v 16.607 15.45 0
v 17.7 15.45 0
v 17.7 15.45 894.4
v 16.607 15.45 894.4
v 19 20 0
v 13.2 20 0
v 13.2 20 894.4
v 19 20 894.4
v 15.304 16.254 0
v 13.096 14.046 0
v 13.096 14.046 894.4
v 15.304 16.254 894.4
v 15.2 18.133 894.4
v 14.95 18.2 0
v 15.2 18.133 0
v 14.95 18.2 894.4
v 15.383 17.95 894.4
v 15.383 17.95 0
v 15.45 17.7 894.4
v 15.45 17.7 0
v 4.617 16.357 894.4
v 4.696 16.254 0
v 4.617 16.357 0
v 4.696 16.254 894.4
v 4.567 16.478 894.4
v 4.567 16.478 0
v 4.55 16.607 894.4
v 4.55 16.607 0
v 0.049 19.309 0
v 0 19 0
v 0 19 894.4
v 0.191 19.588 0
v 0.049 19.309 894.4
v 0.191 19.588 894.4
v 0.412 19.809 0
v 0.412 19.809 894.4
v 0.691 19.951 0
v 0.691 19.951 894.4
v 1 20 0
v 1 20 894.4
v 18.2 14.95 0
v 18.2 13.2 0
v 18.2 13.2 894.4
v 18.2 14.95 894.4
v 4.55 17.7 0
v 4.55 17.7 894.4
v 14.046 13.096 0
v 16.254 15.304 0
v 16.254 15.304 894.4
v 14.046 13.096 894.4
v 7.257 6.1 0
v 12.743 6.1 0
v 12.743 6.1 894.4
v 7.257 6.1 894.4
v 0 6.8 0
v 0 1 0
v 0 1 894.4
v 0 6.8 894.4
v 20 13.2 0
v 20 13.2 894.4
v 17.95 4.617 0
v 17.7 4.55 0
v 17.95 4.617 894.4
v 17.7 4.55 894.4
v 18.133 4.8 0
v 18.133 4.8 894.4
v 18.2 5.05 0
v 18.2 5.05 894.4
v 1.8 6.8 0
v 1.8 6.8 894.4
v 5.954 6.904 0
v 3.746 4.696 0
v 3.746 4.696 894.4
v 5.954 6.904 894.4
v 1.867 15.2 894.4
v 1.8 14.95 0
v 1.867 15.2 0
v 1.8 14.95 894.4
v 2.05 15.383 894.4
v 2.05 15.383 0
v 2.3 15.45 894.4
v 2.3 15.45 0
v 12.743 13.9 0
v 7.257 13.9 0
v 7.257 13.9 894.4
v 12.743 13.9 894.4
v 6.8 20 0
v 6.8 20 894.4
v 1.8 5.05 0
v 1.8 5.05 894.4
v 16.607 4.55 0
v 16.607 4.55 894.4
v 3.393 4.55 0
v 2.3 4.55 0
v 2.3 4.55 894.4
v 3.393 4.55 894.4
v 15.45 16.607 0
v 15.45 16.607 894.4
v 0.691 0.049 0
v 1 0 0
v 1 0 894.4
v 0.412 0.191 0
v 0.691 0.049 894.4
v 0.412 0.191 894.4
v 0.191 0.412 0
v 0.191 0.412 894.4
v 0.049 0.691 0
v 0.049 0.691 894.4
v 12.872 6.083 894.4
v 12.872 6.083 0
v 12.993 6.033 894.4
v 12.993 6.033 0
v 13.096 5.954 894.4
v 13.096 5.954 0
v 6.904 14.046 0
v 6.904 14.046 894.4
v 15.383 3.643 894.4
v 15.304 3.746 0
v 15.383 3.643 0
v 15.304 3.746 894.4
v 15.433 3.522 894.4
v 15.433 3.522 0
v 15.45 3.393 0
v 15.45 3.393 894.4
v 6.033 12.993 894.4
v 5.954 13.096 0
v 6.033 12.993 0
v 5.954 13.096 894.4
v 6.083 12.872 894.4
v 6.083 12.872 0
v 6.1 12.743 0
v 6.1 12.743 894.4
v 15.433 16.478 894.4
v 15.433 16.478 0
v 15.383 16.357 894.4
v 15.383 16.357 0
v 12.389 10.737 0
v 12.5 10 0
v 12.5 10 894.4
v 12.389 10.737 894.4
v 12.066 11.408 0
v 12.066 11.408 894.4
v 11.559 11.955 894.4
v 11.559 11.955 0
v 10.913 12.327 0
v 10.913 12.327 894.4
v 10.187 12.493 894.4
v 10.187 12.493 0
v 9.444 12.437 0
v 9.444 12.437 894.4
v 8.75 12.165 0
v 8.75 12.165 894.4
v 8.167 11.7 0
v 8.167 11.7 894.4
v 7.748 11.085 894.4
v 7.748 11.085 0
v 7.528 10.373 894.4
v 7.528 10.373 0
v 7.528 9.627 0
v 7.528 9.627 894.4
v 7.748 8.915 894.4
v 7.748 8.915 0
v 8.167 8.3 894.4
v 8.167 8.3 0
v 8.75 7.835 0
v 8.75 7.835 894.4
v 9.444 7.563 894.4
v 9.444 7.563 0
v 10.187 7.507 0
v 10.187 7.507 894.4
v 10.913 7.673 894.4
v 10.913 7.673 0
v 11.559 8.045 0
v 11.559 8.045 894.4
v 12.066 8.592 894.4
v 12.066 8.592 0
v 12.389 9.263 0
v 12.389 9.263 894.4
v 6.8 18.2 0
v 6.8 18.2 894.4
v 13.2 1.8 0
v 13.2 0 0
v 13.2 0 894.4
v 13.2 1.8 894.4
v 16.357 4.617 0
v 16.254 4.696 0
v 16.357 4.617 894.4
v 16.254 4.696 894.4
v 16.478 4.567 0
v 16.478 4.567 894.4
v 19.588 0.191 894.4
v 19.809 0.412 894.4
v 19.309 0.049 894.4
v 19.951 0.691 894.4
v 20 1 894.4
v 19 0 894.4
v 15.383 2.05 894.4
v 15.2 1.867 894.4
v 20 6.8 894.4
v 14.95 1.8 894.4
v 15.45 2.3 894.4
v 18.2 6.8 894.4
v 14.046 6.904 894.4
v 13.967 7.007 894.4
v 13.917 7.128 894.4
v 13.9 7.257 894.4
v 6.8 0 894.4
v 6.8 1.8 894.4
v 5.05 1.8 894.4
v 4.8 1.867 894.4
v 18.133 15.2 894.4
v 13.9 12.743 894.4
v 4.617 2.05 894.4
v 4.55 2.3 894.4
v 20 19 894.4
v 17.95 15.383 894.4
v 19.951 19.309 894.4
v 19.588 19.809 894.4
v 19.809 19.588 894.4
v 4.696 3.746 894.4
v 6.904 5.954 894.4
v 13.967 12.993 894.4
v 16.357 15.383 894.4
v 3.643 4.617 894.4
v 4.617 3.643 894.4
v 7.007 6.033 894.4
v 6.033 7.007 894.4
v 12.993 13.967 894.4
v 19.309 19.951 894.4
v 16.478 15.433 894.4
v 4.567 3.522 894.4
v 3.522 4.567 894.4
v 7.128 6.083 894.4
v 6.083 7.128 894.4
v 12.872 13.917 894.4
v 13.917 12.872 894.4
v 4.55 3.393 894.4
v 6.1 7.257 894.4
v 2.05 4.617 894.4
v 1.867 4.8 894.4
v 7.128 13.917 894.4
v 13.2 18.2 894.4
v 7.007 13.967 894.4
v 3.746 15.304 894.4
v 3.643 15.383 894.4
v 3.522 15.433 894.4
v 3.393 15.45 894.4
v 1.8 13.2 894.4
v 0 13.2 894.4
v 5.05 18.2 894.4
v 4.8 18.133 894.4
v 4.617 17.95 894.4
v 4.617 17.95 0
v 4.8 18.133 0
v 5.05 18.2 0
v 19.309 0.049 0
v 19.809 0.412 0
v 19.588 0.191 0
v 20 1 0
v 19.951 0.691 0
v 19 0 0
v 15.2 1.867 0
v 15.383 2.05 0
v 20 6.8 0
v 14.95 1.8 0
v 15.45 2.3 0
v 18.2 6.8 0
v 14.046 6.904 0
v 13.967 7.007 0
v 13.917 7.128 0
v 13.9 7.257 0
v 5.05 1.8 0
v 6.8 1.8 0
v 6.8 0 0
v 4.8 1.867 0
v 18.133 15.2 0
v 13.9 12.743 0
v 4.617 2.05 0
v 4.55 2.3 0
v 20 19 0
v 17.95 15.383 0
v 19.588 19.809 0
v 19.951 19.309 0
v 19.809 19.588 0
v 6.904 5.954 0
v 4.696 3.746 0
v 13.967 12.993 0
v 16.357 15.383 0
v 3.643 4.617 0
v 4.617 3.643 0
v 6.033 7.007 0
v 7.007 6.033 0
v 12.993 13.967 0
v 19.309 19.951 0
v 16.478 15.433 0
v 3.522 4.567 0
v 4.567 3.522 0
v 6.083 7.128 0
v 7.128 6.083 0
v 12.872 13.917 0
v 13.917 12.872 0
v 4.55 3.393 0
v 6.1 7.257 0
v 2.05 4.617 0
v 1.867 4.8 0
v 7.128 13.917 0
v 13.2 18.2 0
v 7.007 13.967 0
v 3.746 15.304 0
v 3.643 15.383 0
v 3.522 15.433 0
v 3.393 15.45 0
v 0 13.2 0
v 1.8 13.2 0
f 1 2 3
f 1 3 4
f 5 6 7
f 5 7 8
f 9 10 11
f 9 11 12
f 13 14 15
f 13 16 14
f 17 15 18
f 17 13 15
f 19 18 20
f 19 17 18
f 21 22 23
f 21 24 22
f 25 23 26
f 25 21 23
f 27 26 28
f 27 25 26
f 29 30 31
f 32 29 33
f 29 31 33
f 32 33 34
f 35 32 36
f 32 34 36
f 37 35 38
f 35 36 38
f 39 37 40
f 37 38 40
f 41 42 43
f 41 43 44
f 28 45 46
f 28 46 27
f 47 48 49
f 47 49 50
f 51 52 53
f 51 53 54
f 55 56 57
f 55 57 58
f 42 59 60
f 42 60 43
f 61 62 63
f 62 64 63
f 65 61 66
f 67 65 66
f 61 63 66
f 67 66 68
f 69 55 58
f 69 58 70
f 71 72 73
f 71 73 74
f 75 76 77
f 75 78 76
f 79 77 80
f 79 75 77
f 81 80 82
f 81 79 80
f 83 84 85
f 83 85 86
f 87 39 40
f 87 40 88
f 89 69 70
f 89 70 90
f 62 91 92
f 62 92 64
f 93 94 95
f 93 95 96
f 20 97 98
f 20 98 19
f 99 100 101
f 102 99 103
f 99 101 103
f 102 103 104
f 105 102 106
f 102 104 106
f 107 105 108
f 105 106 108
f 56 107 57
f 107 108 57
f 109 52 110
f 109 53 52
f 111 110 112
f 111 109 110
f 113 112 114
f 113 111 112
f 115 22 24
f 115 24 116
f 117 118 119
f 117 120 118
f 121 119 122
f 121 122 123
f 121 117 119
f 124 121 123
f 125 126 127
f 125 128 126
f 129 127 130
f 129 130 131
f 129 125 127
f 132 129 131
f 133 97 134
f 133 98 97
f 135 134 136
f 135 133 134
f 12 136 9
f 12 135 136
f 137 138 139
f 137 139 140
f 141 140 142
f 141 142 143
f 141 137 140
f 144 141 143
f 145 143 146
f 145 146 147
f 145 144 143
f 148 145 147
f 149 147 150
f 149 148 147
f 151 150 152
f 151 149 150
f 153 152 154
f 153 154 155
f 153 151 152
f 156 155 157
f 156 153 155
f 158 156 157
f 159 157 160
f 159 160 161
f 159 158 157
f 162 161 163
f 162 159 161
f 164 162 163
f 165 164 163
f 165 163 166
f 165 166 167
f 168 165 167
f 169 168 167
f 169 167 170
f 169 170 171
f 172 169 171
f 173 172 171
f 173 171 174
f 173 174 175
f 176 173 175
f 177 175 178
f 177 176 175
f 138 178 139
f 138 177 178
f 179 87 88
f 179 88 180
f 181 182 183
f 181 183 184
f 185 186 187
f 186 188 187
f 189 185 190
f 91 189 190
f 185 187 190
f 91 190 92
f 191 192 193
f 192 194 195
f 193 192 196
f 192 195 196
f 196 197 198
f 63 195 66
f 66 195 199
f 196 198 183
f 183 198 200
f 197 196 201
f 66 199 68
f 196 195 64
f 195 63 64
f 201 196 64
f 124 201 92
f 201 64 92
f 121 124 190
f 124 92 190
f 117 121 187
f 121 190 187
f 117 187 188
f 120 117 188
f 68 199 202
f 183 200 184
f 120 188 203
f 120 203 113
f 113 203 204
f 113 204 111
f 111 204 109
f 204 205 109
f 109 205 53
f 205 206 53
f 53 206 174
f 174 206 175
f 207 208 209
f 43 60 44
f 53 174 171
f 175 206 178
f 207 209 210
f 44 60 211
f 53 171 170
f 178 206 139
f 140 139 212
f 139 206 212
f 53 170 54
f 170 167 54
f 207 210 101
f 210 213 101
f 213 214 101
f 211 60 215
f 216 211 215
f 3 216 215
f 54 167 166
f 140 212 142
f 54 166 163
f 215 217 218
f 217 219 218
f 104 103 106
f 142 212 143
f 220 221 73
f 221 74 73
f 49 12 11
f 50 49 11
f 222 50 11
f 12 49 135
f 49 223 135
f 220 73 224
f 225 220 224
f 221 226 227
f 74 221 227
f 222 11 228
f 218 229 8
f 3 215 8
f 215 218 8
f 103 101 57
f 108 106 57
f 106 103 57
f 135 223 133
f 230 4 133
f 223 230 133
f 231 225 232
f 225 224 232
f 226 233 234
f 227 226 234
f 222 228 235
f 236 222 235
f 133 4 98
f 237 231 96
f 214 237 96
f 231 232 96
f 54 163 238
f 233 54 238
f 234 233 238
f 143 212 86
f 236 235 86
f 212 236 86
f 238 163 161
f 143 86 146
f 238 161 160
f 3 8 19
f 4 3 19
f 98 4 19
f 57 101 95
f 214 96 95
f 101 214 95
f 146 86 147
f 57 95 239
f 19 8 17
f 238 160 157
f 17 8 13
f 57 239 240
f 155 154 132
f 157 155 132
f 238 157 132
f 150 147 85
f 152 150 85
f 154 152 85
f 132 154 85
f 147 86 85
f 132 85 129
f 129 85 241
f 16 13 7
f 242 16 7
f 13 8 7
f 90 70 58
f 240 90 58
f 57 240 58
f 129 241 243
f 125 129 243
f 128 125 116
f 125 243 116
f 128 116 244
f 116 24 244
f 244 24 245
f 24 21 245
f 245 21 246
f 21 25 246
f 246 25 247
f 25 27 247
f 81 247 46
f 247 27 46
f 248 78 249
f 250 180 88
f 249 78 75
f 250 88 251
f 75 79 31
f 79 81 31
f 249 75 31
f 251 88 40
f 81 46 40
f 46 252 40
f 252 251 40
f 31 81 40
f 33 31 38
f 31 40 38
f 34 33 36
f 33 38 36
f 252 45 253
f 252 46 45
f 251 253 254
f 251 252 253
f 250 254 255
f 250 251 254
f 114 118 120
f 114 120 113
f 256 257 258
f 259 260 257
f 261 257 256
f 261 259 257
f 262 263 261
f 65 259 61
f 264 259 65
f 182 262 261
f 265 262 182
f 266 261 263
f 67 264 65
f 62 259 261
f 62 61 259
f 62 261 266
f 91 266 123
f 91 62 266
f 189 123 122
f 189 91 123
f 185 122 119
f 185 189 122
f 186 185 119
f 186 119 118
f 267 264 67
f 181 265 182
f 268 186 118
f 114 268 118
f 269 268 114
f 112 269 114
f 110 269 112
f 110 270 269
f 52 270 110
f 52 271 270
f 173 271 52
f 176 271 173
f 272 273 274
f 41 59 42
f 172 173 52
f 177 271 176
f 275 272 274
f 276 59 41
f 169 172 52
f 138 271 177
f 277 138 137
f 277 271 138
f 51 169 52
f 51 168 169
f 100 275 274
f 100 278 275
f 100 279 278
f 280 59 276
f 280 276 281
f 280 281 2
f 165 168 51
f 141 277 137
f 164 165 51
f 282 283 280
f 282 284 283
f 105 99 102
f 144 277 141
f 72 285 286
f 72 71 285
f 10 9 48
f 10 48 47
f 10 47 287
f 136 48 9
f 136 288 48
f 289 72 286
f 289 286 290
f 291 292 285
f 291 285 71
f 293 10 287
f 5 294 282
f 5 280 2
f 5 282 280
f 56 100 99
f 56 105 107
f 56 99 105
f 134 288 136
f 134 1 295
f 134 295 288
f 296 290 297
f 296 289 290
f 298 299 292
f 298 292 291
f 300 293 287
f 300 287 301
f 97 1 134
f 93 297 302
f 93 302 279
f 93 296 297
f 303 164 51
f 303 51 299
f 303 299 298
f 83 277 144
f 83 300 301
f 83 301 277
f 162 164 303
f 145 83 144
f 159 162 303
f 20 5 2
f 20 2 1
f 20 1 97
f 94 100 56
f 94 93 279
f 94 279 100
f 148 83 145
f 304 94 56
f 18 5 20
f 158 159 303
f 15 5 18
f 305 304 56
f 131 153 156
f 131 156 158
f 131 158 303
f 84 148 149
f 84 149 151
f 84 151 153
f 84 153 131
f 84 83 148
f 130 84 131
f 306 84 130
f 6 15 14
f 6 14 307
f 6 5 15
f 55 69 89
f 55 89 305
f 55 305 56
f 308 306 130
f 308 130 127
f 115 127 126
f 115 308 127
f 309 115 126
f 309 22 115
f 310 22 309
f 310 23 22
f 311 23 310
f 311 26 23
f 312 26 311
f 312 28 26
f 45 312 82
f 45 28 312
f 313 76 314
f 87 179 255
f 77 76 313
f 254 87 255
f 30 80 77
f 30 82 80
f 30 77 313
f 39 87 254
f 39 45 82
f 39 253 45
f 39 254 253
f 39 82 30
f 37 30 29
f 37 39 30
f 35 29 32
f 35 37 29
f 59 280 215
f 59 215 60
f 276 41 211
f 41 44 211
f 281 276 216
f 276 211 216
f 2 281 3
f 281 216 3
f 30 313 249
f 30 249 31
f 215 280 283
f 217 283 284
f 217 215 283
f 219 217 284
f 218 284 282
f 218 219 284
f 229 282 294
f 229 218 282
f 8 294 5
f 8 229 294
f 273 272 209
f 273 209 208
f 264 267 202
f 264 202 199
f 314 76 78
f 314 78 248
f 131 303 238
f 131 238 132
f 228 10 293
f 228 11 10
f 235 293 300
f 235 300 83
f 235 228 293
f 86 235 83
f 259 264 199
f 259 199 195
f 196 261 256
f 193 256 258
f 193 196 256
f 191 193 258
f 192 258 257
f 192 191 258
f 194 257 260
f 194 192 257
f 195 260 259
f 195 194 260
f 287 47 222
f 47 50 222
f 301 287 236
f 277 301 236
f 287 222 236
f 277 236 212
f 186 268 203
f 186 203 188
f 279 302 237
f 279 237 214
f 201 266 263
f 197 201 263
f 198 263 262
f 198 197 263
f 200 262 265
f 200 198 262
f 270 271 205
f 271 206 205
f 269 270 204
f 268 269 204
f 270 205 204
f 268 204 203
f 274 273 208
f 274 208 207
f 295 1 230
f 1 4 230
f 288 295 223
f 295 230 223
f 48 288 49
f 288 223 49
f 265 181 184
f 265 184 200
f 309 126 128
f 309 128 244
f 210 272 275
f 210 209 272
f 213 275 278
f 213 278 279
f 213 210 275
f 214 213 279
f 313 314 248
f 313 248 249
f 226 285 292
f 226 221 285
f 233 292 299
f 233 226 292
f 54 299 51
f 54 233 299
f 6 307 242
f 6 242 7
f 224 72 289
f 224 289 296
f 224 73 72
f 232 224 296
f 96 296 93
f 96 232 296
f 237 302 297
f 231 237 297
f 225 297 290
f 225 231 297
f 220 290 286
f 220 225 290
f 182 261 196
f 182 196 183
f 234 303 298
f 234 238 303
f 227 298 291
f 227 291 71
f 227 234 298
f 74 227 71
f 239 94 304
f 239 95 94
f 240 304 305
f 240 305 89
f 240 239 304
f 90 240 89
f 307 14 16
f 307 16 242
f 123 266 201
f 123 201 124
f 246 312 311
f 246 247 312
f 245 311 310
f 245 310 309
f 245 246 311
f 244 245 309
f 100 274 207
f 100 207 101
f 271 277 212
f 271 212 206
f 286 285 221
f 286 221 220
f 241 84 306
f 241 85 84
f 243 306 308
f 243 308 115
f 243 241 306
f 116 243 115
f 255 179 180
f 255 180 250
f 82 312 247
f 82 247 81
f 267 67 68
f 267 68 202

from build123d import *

# Parameters (mm, degrees)
SKETCH1_R           = 2.5
BOSS_EXTRUDE1_DEPTH = 894.4
FILLET1_R           = 1
FILLET2_R           = 0.5
FILLET3_R           = 0.5
FILLET4_R           = 0.5
FILLET5_R           = 0.5


with BuildPart() as part:
    # Sketch1 → Boss-Extrude1 (new body)
    with BuildSketch(Plane.XY):
        Polygon((13.2, 0), (13.2, 1.8), (15.45, 1.8), (15.45, 3.6), (12.95, 6.1), (7.05, 6.1), (4.55, 3.6), (4.55, 1.8), (6.8, 1.8), (6.8, 0), (0, 0), (0, 6.8), (1.8, 6.8), (1.8, 4.55), (3.6, 4.55), (6.1, 7.05), (6.1, 12.95), (3.6, 15.45), (1.8, 15.45), (1.8, 13.2), (0, 13.2), (0, 20), (6.8, 20), (6.8, 18.2), (4.55, 18.2), (4.55, 16.4), (7.05, 13.9), (12.95, 13.9), (15.45, 16.4), (15.45, 18.2), (13.2, 18.2), (13.2, 20), (20, 20), (20, 13.2), (18.2, 13.2), (18.2, 15.45), (16.4, 15.45), (13.9, 12.95), (13.9, 7.05), (16.4, 4.55), (18.2, 4.55), (18.2, 6.8), (20, 6.8), (20, 0), align=None)
        with Locations((10, 10)):
            Circle(SKETCH1_R, mode=Mode.SUBTRACT)
    extrude(amount=BOSS_EXTRUDE1_DEPTH)

    # Fillet1
    fillet1_edges = [part.edges().sort_by_distance(p)[0] for p in [
        (0, 0, 447.2),
        (0, 20, 447.2),
        (20, 20, 447.2),
        (20, 0, 447.2),
    ]]
    fillet(fillet1_edges, radius=FILLET1_R)

    # Fillet2
    fillet2_edges = [part.edges().sort_by_distance(p)[0] for p in [
        (4.55, 18.2, 447.2),
        (4.55, 16.4, 447.2),
        (7.05, 13.9, 447.2),
        (12.95, 13.9, 447.2),
        (15.45, 16.4, 447.2),
        (15.45, 18.2, 447.2),
    ]]
    fillet(fillet2_edges, radius=FILLET2_R)

    # Fillet3
    fillet3_edges = [part.edges().sort_by_distance(p)[0] for p in [
        (18.2, 15.45, 447.2),
        (16.4, 15.45, 447.2),
        (13.9, 12.95, 447.2),
        (13.9, 7.05, 447.2),
        (16.4, 4.55, 447.2),
        (18.2, 4.55, 447.2),
    ]]
    fillet(fillet3_edges, radius=FILLET3_R)

    # Fillet4
    fillet4_edges = [part.edges().sort_by_distance(p)[0] for p in [
        (1.8, 4.55, 447.2),
        (3.6, 4.55, 447.2),
        (6.1, 7.05, 447.2),
        (6.1, 12.95, 447.2),
        (3.6, 15.45, 447.2),
        (1.8, 15.45, 447.2),
    ]]
    fillet(fillet4_edges, radius=FILLET4_R)

    # Fillet5
    fillet5_edges = [part.edges().sort_by_distance(p)[0] for p in [
        (15.45, 1.8, 447.2),
        (15.45, 3.6, 447.2),
        (12.95, 6.1, 447.2),
        (7.05, 6.1, 447.2),
        (4.55, 3.6, 447.2),
        (4.55, 1.8, 447.2),
    ]]
    fillet(fillet5_edges, radius=FILLET5_R)


solid = part.part
